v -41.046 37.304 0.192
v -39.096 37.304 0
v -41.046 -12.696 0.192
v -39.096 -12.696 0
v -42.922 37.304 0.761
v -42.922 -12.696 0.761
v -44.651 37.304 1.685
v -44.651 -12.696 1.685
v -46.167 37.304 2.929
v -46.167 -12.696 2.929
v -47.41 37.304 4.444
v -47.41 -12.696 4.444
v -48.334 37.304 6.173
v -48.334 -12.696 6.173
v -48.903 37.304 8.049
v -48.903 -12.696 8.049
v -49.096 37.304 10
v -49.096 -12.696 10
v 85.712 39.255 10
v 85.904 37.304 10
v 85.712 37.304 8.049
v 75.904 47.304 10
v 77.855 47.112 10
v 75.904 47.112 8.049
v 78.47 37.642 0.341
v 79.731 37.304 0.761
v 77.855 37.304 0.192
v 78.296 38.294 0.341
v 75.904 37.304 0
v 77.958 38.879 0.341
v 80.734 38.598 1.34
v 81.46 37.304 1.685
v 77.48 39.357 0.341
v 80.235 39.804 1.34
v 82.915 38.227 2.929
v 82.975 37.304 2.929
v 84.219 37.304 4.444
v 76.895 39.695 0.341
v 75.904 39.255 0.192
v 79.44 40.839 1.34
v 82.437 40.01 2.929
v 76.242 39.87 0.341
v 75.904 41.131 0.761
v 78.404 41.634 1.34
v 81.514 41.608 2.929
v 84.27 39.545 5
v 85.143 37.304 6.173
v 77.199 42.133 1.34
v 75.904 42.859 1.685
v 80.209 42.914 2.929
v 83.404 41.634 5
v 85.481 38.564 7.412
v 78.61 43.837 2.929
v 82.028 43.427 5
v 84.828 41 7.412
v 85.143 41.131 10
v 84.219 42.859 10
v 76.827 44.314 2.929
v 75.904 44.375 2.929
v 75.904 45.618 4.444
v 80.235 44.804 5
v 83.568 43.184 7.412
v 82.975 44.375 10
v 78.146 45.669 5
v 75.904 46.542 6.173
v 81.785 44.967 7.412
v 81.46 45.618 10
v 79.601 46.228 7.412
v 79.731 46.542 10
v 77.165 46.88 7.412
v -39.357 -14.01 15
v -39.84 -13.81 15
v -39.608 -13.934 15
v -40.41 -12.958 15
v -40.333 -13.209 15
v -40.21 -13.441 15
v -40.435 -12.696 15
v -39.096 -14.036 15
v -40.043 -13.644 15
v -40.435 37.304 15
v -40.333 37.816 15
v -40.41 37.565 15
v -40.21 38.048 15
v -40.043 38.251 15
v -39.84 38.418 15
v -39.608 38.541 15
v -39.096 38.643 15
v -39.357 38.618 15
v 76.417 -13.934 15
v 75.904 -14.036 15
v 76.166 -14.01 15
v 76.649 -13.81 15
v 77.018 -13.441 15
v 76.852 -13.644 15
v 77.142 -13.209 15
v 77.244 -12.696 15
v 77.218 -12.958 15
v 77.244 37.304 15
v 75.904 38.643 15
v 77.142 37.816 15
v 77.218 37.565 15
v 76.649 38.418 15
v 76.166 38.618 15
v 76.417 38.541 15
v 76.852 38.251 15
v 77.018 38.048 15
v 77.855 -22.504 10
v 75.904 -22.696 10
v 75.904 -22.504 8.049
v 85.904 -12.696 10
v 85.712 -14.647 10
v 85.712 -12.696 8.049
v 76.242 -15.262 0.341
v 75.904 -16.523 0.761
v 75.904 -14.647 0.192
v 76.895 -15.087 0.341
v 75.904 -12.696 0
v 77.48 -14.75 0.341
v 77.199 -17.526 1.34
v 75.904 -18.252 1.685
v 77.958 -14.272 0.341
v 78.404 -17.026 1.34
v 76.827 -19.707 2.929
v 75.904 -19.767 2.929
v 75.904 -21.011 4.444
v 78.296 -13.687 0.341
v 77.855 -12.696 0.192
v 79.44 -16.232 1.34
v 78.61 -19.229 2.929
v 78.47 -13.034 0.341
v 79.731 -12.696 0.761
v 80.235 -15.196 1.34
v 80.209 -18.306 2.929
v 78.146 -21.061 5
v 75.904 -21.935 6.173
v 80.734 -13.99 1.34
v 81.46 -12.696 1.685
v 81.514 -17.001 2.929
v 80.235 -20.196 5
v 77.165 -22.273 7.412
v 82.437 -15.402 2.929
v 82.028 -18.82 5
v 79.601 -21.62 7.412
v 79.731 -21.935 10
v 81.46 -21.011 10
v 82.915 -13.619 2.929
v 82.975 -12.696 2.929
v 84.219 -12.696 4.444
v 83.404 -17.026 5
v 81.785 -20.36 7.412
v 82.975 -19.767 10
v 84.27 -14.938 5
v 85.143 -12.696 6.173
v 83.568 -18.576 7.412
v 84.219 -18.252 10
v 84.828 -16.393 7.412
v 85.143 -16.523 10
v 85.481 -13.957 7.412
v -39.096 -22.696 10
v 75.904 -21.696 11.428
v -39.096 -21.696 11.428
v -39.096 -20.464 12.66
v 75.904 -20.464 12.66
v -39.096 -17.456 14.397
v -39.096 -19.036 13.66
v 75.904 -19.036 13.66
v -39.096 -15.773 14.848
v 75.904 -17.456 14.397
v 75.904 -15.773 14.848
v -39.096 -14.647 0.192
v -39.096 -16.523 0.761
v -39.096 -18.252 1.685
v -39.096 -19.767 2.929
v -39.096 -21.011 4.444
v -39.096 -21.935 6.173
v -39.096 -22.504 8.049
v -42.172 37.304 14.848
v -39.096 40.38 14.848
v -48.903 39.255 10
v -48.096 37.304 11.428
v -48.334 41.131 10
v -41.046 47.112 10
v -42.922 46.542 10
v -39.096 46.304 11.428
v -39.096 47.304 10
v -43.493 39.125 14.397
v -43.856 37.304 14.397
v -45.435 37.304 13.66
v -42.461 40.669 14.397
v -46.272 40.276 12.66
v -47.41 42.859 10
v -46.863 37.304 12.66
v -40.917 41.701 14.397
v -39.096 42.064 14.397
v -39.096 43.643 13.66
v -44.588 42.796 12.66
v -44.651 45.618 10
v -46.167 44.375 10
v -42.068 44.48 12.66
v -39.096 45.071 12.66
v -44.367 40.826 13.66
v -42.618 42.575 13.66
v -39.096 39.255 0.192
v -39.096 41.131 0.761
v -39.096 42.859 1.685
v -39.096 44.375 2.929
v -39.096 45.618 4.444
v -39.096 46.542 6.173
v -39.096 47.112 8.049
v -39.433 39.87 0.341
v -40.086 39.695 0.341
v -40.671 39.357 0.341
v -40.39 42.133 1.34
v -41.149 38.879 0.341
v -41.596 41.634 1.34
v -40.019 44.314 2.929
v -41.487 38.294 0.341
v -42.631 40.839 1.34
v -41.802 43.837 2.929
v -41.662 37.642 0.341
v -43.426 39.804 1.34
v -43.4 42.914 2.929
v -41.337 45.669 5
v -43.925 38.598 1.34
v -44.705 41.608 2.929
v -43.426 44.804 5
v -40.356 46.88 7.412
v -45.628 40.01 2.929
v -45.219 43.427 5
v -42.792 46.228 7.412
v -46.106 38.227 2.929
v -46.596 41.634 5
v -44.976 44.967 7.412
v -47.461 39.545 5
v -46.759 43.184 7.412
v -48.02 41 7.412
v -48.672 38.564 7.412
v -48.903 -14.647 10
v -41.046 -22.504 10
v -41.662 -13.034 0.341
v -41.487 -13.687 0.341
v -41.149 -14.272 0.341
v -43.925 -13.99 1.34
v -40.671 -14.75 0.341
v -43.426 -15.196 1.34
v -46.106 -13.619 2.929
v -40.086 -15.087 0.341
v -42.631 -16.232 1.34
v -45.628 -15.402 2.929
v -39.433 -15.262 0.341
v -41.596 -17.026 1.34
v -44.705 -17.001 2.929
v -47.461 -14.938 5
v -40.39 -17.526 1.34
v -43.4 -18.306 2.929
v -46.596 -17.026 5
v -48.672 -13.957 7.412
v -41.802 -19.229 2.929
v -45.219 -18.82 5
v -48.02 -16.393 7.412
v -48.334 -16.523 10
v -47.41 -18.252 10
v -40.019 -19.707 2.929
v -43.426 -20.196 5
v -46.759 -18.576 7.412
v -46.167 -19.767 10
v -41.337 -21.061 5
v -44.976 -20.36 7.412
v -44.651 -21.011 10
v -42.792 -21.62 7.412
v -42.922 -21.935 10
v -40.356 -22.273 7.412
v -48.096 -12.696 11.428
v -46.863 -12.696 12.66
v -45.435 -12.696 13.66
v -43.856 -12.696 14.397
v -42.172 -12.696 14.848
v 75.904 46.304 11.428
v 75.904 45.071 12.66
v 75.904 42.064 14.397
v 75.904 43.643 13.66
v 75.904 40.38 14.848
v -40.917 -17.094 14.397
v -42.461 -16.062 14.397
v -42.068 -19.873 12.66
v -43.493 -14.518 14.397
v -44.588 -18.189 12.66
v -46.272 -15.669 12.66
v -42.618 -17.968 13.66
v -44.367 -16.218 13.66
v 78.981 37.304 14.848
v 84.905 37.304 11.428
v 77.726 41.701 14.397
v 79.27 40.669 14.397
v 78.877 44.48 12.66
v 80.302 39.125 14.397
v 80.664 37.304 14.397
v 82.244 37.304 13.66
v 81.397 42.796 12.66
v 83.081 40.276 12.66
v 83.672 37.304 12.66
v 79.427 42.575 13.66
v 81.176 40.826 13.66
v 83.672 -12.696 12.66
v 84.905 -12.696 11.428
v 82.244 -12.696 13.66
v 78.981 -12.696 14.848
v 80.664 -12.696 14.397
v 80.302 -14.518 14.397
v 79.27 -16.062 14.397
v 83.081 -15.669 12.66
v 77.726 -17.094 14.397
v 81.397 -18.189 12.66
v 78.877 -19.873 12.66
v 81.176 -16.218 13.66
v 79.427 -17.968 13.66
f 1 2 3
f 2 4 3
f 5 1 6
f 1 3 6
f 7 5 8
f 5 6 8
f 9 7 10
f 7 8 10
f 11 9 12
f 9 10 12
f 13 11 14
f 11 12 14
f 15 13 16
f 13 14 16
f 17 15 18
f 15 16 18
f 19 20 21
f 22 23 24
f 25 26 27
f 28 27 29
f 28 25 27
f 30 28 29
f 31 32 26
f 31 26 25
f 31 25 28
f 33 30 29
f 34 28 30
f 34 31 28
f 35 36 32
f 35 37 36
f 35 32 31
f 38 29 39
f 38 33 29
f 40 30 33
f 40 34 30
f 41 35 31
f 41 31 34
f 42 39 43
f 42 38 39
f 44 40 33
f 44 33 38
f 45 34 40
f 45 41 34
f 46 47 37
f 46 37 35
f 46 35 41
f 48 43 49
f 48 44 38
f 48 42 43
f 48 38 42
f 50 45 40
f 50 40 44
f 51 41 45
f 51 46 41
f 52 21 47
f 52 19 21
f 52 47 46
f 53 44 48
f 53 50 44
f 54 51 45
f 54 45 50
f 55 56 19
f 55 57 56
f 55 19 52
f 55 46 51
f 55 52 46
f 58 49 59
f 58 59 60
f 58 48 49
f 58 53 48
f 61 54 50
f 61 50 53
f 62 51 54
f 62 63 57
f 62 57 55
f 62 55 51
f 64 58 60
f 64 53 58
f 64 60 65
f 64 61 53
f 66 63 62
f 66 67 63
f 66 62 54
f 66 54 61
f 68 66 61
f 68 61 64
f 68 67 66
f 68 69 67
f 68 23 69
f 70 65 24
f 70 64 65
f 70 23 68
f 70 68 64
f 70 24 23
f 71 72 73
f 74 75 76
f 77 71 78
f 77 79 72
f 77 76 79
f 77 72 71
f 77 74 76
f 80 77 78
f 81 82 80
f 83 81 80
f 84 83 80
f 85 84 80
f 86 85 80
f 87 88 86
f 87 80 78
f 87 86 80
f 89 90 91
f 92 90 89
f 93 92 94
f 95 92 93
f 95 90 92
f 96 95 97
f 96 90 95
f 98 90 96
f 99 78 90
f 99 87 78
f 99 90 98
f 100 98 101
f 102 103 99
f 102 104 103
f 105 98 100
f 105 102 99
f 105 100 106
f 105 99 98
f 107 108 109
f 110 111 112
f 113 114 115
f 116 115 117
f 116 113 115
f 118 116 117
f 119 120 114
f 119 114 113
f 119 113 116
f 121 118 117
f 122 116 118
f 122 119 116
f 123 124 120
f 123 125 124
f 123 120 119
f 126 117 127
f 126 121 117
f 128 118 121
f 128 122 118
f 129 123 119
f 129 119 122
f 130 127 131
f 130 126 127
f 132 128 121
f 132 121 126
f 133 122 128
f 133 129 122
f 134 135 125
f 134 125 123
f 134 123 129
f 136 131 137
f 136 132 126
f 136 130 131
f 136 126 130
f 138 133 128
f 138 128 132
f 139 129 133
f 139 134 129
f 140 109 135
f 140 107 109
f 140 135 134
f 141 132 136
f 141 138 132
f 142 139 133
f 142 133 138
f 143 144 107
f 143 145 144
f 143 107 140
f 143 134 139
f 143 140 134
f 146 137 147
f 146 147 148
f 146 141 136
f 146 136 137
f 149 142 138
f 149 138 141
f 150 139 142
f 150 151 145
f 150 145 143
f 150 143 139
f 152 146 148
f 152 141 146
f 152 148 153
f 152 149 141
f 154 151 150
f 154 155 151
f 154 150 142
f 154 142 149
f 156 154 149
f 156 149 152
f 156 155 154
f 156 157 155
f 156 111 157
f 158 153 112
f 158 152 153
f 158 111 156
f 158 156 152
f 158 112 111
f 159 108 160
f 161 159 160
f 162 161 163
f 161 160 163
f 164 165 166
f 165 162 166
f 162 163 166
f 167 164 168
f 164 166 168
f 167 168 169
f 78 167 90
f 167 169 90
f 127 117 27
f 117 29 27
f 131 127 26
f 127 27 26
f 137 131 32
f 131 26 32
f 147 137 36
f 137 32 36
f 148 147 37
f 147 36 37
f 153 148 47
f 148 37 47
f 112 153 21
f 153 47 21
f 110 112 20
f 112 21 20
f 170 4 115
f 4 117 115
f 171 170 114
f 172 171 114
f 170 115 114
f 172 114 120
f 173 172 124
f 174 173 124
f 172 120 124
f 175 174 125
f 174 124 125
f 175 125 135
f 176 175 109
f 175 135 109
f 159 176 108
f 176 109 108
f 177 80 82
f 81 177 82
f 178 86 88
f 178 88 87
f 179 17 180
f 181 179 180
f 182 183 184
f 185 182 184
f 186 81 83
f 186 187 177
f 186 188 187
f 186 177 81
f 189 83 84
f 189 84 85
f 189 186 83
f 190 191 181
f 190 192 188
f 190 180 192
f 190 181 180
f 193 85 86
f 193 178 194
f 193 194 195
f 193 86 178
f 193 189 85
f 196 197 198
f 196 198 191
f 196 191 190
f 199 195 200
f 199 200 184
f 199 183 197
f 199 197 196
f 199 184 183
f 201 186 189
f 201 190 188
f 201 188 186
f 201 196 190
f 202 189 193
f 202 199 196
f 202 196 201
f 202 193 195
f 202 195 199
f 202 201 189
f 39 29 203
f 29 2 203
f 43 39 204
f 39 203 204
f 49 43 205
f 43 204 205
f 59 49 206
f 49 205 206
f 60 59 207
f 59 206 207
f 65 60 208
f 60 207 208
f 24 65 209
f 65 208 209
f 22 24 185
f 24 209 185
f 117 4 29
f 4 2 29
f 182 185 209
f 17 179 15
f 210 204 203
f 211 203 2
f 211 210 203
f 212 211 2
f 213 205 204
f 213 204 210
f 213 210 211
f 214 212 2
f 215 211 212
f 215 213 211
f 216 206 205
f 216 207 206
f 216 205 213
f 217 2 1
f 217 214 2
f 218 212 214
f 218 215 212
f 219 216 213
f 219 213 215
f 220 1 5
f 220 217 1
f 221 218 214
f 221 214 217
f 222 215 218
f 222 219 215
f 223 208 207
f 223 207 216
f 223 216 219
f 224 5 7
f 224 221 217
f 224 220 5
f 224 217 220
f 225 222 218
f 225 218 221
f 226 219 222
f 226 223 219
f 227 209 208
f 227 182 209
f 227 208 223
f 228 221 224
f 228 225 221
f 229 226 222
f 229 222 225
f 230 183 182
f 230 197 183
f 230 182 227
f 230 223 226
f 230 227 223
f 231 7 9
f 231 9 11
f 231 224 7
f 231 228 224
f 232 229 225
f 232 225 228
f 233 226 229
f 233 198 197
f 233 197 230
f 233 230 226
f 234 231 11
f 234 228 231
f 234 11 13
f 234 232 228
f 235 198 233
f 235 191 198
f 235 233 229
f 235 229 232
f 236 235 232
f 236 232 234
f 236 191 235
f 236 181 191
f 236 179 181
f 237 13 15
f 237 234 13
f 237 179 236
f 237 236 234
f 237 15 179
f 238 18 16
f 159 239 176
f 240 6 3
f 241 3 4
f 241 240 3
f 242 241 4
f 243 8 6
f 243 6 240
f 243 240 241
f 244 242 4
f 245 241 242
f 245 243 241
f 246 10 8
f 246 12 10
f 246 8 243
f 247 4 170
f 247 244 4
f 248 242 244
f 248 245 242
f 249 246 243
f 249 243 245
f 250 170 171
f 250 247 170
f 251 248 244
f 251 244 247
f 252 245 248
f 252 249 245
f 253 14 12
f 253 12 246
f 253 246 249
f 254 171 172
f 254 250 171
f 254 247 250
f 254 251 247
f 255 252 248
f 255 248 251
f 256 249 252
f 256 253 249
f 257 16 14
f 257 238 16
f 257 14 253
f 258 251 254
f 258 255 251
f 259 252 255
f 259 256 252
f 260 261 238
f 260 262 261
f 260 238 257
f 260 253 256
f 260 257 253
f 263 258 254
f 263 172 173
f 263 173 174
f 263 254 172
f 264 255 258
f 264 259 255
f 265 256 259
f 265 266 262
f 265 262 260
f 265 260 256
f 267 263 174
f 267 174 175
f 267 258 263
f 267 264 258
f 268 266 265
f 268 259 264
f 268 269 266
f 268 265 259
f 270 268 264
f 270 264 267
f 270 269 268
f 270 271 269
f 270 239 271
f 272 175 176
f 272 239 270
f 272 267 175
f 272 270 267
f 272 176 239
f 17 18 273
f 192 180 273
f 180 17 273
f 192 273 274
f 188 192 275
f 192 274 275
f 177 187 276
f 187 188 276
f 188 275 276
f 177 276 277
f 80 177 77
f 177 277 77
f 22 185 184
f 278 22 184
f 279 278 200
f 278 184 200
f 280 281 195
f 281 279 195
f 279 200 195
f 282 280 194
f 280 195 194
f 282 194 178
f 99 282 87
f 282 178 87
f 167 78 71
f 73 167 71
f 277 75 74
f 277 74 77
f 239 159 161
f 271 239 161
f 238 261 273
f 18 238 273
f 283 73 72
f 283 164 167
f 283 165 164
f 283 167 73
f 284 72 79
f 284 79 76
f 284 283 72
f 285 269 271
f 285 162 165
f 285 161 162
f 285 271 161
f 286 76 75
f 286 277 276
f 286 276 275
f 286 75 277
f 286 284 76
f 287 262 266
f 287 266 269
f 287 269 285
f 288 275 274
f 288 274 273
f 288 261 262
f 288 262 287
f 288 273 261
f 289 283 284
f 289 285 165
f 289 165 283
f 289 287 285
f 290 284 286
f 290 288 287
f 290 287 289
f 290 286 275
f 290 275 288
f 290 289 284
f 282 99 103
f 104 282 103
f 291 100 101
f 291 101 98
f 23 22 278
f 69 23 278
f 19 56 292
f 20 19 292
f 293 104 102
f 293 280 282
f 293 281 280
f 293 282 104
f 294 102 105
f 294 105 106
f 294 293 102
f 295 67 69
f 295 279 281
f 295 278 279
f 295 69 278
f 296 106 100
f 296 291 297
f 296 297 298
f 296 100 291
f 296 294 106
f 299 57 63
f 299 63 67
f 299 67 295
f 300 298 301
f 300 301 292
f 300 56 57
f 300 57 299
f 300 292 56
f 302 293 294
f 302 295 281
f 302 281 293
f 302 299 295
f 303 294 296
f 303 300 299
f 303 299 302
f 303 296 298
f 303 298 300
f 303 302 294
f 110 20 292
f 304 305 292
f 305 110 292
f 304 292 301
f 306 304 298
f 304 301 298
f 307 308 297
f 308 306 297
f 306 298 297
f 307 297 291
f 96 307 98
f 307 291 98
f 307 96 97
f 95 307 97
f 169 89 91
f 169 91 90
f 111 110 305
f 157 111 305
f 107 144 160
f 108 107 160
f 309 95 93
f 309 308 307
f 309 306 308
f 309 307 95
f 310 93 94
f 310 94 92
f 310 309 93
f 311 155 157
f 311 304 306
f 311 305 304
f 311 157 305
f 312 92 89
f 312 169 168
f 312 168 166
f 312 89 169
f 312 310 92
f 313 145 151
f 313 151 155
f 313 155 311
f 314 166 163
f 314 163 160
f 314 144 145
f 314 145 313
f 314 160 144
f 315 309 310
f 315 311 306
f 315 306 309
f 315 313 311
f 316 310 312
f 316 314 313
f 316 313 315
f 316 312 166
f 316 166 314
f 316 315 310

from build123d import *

# Parameters (mm, degrees)
SKETCH1_W           = 135
SKETCH1_H           = 70
BOSS_EXTRUDE1_DEPTH = 15
FILLET2_R           = 10
FILLET3_R           = 10
FILLET4_R           = 10
FILLET5_R           = 10
FILLET12_R          = 10
FILLET13_R          = 10


with BuildPart() as part:
    # Sketch1 → Boss-Extrude1 (new body)
    with BuildSketch(Plane.XY):
        with Locations((18.404407689, 12.303703611)):
            Rectangle(SKETCH1_W, SKETCH1_H)
    extrude(amount=BOSS_EXTRUDE1_DEPTH)

    # Fillet2
    fillet2_edges = [part.edges().sort_by_distance(p)[0] for p in [
        (-49.095592311, -22.696296389, 7.5),
    ]]
    fillet(fillet2_edges, radius=FILLET2_R)

    # Fillet3
    fillet3_edges = [part.edges().sort_by_distance(p)[0] for p in [
        (-49.095592311, 47.303703611, 7.5),
    ]]
    fillet(fillet3_edges, radius=FILLET3_R)

    # Fillet4
    fillet4_edges = [part.edges().sort_by_distance(p)[0] for p in [
        (85.904407689, 47.303703611, 7.5),
    ]]
    fillet(fillet4_edges, radius=FILLET4_R)

    # Fillet5
    fillet5_edges = [part.edges().sort_by_distance(p)[0] for p in [
        (85.904407689, -22.696296389, 7.5),
    ]]
    fillet(fillet5_edges, radius=FILLET5_R)

    # Fillet12
    fillet12_edges = [part.edges().sort_by_distance(p)[0] for p in [
        (18.404407689, -22.696296389, 0),
        (-46.166660123, -19.7673642, 0),
        (-49.095592311, 12.303703611, 0),
        (-46.166660123, 44.374771423, 0),
        (18.404407689, 47.303703611, 0),
        (82.975475501, 44.374771423, 0),
        (85.904407689, 12.303703611, 0),
        (82.975475501, -19.7673642, 0),
    ]]
    fillet(fillet12_edges, radius=FILLET12_R)

    # Fillet13
    # the kernel refuses this fillet: 10 mm, written as the material it takes off along each edge
    with BuildSketch(Plane(origin=(75.904407689, 37.303703611, 15), x_dir=(0, 1, 0), z_dir=(-1, 0, 0))) as fillet13_piece_1:
        with BuildLine():
            CenterArc((1.339745962, 10), FILLET13_R, 270, 60)
            Line((10, 5), (10.173205081, 4.9))
            ThreePointArc((10.173205081, 4.9), (10.2, 2.5), (10.2, 0))
            Line((10.2, 0), (10, -0.2))
            Line((10, -0.2), (1.339745962, -0.2))
            Line((1.339745962, -0.2), (1.339745962, 0))
        make_face()
    revolve(axis=Axis((75.904407689, 37.303703611, 15), (0, 0, -1)), revolution_arc=90, mode=Mode.SUBTRACT)
    with BuildSketch(Plane(origin=(75.904407689, -12.696296389, 15), x_dir=(1, 0, 0), z_dir=(0, 1, 0))) as fillet13_piece_2:
        with BuildLine():
            CenterArc((1.339745962, 10), FILLET13_R, 270, 60)
            Line((1.339745962, 0), (1.339745962, -0.2))
            Line((1.339745962, -0.2), (10, -0.2))
            Line((10, -0.2), (10.2, 0))
            ThreePointArc((10.2, 0), (10.2, 2.5), (10.173205081, 4.9))
            Line((10.173205081, 4.9), (10, 5))
        make_face()
    revolve(axis=Axis((75.904407689, -12.696296389, 15), (0, 0, -1)), revolution_arc=90, mode=Mode.SUBTRACT)
    with BuildSketch(Plane(origin=(-39.095592311, -12.696296389, 15), x_dir=(0, -1, 0), z_dir=(1, 0, 0))) as fillet13_piece_3:
        with BuildLine():
            CenterArc((1.339745962, 10), FILLET13_R, 270, 60)
            Line((10, 5), (10.173205081, 4.9))
            ThreePointArc((10.173205081, 4.9), (10.2, 2.5), (10.2, 0))
            Line((10.2, 0), (10, -0.2))
            Line((10, -0.2), (1.339745962, -0.2))
            Line((1.339745962, -0.2), (1.339745962, 0))
        make_face()
    revolve(axis=Axis((-39.095592311, -12.696296389, 15), (0, 0, -1)), revolution_arc=90, mode=Mode.SUBTRACT)
    with BuildSketch(Plane(origin=(-39.095592311, 37.303703611, 15), x_dir=(-1, 0, 0), z_dir=(0, -1, 0))) as fillet13_piece_4:
        with BuildLine():
            CenterArc((1.339745962, 10), FILLET13_R, 270, 60)
            Line((10, 5), (10.173205081, 4.9))
            ThreePointArc((10.173205081, 4.9), (10.2, 2.5), (10.2, 0))
            Line((10.2, 0), (10, -0.2))
            Line((10, -0.2), (1.339745962, -0.2))
            Line((1.339745962, -0.2), (1.339745962, 0))
        make_face()
    revolve(axis=Axis((-39.095592311, 37.303703611, 15), (0, 0, -1)), revolution_arc=90, mode=Mode.SUBTRACT)
    with BuildSketch(Plane(origin=(-49.095592311, -12.696296389, 15), x_dir=(0, 0, -1), z_dir=(0, 1, 0)), Plane(origin=(85.904407689, 37.303703611, 15), x_dir=(0, 0, -1), z_dir=(0, -1, 0))) as fillet13_piece_5:
        with BuildLine():
            CenterArc((10, -8.660254038), FILLET13_R, 120, 60)
            Line((0, -8.660254038), (-0.2, -8.660254038))
            Line((-0.2, -8.660254038), (-0.2, 0))
            Line((-0.2, 0), (0, 0.2))
            ThreePointArc((0, 0.2), (2.5, 0.2), (4.9, 0.173205081))
            Line((4.9, 0.173205081), (5, 0))
        make_face()
    extrude(amount=50, mode=Mode.SUBTRACT)
    with BuildSketch(Plane(origin=(75.904407689, -22.696296389, 15), x_dir=(0, 0, -1), z_dir=(-1, 0, 0)), Plane(origin=(-39.095592311, 47.303703611, 15), x_dir=(0, 0, -1), z_dir=(1, 0, 0))) as fillet13_piece_6:
        with BuildLine():
            CenterArc((10, -8.660254038), FILLET13_R, 120, 60)
            Line((0, -8.660254038), (-0.2, -8.660254038))
            Line((-0.2, -8.660254038), (-0.2, 0))
            Line((-0.2, 0), (0, 0.2))
            ThreePointArc((0, 0.2), (2.5, 0.2), (4.9, 0.173205081))
            Line((4.9, 0.173205081), (5, 0))
        make_face()
    extrude(amount=115, mode=Mode.SUBTRACT)


solid = part.part
